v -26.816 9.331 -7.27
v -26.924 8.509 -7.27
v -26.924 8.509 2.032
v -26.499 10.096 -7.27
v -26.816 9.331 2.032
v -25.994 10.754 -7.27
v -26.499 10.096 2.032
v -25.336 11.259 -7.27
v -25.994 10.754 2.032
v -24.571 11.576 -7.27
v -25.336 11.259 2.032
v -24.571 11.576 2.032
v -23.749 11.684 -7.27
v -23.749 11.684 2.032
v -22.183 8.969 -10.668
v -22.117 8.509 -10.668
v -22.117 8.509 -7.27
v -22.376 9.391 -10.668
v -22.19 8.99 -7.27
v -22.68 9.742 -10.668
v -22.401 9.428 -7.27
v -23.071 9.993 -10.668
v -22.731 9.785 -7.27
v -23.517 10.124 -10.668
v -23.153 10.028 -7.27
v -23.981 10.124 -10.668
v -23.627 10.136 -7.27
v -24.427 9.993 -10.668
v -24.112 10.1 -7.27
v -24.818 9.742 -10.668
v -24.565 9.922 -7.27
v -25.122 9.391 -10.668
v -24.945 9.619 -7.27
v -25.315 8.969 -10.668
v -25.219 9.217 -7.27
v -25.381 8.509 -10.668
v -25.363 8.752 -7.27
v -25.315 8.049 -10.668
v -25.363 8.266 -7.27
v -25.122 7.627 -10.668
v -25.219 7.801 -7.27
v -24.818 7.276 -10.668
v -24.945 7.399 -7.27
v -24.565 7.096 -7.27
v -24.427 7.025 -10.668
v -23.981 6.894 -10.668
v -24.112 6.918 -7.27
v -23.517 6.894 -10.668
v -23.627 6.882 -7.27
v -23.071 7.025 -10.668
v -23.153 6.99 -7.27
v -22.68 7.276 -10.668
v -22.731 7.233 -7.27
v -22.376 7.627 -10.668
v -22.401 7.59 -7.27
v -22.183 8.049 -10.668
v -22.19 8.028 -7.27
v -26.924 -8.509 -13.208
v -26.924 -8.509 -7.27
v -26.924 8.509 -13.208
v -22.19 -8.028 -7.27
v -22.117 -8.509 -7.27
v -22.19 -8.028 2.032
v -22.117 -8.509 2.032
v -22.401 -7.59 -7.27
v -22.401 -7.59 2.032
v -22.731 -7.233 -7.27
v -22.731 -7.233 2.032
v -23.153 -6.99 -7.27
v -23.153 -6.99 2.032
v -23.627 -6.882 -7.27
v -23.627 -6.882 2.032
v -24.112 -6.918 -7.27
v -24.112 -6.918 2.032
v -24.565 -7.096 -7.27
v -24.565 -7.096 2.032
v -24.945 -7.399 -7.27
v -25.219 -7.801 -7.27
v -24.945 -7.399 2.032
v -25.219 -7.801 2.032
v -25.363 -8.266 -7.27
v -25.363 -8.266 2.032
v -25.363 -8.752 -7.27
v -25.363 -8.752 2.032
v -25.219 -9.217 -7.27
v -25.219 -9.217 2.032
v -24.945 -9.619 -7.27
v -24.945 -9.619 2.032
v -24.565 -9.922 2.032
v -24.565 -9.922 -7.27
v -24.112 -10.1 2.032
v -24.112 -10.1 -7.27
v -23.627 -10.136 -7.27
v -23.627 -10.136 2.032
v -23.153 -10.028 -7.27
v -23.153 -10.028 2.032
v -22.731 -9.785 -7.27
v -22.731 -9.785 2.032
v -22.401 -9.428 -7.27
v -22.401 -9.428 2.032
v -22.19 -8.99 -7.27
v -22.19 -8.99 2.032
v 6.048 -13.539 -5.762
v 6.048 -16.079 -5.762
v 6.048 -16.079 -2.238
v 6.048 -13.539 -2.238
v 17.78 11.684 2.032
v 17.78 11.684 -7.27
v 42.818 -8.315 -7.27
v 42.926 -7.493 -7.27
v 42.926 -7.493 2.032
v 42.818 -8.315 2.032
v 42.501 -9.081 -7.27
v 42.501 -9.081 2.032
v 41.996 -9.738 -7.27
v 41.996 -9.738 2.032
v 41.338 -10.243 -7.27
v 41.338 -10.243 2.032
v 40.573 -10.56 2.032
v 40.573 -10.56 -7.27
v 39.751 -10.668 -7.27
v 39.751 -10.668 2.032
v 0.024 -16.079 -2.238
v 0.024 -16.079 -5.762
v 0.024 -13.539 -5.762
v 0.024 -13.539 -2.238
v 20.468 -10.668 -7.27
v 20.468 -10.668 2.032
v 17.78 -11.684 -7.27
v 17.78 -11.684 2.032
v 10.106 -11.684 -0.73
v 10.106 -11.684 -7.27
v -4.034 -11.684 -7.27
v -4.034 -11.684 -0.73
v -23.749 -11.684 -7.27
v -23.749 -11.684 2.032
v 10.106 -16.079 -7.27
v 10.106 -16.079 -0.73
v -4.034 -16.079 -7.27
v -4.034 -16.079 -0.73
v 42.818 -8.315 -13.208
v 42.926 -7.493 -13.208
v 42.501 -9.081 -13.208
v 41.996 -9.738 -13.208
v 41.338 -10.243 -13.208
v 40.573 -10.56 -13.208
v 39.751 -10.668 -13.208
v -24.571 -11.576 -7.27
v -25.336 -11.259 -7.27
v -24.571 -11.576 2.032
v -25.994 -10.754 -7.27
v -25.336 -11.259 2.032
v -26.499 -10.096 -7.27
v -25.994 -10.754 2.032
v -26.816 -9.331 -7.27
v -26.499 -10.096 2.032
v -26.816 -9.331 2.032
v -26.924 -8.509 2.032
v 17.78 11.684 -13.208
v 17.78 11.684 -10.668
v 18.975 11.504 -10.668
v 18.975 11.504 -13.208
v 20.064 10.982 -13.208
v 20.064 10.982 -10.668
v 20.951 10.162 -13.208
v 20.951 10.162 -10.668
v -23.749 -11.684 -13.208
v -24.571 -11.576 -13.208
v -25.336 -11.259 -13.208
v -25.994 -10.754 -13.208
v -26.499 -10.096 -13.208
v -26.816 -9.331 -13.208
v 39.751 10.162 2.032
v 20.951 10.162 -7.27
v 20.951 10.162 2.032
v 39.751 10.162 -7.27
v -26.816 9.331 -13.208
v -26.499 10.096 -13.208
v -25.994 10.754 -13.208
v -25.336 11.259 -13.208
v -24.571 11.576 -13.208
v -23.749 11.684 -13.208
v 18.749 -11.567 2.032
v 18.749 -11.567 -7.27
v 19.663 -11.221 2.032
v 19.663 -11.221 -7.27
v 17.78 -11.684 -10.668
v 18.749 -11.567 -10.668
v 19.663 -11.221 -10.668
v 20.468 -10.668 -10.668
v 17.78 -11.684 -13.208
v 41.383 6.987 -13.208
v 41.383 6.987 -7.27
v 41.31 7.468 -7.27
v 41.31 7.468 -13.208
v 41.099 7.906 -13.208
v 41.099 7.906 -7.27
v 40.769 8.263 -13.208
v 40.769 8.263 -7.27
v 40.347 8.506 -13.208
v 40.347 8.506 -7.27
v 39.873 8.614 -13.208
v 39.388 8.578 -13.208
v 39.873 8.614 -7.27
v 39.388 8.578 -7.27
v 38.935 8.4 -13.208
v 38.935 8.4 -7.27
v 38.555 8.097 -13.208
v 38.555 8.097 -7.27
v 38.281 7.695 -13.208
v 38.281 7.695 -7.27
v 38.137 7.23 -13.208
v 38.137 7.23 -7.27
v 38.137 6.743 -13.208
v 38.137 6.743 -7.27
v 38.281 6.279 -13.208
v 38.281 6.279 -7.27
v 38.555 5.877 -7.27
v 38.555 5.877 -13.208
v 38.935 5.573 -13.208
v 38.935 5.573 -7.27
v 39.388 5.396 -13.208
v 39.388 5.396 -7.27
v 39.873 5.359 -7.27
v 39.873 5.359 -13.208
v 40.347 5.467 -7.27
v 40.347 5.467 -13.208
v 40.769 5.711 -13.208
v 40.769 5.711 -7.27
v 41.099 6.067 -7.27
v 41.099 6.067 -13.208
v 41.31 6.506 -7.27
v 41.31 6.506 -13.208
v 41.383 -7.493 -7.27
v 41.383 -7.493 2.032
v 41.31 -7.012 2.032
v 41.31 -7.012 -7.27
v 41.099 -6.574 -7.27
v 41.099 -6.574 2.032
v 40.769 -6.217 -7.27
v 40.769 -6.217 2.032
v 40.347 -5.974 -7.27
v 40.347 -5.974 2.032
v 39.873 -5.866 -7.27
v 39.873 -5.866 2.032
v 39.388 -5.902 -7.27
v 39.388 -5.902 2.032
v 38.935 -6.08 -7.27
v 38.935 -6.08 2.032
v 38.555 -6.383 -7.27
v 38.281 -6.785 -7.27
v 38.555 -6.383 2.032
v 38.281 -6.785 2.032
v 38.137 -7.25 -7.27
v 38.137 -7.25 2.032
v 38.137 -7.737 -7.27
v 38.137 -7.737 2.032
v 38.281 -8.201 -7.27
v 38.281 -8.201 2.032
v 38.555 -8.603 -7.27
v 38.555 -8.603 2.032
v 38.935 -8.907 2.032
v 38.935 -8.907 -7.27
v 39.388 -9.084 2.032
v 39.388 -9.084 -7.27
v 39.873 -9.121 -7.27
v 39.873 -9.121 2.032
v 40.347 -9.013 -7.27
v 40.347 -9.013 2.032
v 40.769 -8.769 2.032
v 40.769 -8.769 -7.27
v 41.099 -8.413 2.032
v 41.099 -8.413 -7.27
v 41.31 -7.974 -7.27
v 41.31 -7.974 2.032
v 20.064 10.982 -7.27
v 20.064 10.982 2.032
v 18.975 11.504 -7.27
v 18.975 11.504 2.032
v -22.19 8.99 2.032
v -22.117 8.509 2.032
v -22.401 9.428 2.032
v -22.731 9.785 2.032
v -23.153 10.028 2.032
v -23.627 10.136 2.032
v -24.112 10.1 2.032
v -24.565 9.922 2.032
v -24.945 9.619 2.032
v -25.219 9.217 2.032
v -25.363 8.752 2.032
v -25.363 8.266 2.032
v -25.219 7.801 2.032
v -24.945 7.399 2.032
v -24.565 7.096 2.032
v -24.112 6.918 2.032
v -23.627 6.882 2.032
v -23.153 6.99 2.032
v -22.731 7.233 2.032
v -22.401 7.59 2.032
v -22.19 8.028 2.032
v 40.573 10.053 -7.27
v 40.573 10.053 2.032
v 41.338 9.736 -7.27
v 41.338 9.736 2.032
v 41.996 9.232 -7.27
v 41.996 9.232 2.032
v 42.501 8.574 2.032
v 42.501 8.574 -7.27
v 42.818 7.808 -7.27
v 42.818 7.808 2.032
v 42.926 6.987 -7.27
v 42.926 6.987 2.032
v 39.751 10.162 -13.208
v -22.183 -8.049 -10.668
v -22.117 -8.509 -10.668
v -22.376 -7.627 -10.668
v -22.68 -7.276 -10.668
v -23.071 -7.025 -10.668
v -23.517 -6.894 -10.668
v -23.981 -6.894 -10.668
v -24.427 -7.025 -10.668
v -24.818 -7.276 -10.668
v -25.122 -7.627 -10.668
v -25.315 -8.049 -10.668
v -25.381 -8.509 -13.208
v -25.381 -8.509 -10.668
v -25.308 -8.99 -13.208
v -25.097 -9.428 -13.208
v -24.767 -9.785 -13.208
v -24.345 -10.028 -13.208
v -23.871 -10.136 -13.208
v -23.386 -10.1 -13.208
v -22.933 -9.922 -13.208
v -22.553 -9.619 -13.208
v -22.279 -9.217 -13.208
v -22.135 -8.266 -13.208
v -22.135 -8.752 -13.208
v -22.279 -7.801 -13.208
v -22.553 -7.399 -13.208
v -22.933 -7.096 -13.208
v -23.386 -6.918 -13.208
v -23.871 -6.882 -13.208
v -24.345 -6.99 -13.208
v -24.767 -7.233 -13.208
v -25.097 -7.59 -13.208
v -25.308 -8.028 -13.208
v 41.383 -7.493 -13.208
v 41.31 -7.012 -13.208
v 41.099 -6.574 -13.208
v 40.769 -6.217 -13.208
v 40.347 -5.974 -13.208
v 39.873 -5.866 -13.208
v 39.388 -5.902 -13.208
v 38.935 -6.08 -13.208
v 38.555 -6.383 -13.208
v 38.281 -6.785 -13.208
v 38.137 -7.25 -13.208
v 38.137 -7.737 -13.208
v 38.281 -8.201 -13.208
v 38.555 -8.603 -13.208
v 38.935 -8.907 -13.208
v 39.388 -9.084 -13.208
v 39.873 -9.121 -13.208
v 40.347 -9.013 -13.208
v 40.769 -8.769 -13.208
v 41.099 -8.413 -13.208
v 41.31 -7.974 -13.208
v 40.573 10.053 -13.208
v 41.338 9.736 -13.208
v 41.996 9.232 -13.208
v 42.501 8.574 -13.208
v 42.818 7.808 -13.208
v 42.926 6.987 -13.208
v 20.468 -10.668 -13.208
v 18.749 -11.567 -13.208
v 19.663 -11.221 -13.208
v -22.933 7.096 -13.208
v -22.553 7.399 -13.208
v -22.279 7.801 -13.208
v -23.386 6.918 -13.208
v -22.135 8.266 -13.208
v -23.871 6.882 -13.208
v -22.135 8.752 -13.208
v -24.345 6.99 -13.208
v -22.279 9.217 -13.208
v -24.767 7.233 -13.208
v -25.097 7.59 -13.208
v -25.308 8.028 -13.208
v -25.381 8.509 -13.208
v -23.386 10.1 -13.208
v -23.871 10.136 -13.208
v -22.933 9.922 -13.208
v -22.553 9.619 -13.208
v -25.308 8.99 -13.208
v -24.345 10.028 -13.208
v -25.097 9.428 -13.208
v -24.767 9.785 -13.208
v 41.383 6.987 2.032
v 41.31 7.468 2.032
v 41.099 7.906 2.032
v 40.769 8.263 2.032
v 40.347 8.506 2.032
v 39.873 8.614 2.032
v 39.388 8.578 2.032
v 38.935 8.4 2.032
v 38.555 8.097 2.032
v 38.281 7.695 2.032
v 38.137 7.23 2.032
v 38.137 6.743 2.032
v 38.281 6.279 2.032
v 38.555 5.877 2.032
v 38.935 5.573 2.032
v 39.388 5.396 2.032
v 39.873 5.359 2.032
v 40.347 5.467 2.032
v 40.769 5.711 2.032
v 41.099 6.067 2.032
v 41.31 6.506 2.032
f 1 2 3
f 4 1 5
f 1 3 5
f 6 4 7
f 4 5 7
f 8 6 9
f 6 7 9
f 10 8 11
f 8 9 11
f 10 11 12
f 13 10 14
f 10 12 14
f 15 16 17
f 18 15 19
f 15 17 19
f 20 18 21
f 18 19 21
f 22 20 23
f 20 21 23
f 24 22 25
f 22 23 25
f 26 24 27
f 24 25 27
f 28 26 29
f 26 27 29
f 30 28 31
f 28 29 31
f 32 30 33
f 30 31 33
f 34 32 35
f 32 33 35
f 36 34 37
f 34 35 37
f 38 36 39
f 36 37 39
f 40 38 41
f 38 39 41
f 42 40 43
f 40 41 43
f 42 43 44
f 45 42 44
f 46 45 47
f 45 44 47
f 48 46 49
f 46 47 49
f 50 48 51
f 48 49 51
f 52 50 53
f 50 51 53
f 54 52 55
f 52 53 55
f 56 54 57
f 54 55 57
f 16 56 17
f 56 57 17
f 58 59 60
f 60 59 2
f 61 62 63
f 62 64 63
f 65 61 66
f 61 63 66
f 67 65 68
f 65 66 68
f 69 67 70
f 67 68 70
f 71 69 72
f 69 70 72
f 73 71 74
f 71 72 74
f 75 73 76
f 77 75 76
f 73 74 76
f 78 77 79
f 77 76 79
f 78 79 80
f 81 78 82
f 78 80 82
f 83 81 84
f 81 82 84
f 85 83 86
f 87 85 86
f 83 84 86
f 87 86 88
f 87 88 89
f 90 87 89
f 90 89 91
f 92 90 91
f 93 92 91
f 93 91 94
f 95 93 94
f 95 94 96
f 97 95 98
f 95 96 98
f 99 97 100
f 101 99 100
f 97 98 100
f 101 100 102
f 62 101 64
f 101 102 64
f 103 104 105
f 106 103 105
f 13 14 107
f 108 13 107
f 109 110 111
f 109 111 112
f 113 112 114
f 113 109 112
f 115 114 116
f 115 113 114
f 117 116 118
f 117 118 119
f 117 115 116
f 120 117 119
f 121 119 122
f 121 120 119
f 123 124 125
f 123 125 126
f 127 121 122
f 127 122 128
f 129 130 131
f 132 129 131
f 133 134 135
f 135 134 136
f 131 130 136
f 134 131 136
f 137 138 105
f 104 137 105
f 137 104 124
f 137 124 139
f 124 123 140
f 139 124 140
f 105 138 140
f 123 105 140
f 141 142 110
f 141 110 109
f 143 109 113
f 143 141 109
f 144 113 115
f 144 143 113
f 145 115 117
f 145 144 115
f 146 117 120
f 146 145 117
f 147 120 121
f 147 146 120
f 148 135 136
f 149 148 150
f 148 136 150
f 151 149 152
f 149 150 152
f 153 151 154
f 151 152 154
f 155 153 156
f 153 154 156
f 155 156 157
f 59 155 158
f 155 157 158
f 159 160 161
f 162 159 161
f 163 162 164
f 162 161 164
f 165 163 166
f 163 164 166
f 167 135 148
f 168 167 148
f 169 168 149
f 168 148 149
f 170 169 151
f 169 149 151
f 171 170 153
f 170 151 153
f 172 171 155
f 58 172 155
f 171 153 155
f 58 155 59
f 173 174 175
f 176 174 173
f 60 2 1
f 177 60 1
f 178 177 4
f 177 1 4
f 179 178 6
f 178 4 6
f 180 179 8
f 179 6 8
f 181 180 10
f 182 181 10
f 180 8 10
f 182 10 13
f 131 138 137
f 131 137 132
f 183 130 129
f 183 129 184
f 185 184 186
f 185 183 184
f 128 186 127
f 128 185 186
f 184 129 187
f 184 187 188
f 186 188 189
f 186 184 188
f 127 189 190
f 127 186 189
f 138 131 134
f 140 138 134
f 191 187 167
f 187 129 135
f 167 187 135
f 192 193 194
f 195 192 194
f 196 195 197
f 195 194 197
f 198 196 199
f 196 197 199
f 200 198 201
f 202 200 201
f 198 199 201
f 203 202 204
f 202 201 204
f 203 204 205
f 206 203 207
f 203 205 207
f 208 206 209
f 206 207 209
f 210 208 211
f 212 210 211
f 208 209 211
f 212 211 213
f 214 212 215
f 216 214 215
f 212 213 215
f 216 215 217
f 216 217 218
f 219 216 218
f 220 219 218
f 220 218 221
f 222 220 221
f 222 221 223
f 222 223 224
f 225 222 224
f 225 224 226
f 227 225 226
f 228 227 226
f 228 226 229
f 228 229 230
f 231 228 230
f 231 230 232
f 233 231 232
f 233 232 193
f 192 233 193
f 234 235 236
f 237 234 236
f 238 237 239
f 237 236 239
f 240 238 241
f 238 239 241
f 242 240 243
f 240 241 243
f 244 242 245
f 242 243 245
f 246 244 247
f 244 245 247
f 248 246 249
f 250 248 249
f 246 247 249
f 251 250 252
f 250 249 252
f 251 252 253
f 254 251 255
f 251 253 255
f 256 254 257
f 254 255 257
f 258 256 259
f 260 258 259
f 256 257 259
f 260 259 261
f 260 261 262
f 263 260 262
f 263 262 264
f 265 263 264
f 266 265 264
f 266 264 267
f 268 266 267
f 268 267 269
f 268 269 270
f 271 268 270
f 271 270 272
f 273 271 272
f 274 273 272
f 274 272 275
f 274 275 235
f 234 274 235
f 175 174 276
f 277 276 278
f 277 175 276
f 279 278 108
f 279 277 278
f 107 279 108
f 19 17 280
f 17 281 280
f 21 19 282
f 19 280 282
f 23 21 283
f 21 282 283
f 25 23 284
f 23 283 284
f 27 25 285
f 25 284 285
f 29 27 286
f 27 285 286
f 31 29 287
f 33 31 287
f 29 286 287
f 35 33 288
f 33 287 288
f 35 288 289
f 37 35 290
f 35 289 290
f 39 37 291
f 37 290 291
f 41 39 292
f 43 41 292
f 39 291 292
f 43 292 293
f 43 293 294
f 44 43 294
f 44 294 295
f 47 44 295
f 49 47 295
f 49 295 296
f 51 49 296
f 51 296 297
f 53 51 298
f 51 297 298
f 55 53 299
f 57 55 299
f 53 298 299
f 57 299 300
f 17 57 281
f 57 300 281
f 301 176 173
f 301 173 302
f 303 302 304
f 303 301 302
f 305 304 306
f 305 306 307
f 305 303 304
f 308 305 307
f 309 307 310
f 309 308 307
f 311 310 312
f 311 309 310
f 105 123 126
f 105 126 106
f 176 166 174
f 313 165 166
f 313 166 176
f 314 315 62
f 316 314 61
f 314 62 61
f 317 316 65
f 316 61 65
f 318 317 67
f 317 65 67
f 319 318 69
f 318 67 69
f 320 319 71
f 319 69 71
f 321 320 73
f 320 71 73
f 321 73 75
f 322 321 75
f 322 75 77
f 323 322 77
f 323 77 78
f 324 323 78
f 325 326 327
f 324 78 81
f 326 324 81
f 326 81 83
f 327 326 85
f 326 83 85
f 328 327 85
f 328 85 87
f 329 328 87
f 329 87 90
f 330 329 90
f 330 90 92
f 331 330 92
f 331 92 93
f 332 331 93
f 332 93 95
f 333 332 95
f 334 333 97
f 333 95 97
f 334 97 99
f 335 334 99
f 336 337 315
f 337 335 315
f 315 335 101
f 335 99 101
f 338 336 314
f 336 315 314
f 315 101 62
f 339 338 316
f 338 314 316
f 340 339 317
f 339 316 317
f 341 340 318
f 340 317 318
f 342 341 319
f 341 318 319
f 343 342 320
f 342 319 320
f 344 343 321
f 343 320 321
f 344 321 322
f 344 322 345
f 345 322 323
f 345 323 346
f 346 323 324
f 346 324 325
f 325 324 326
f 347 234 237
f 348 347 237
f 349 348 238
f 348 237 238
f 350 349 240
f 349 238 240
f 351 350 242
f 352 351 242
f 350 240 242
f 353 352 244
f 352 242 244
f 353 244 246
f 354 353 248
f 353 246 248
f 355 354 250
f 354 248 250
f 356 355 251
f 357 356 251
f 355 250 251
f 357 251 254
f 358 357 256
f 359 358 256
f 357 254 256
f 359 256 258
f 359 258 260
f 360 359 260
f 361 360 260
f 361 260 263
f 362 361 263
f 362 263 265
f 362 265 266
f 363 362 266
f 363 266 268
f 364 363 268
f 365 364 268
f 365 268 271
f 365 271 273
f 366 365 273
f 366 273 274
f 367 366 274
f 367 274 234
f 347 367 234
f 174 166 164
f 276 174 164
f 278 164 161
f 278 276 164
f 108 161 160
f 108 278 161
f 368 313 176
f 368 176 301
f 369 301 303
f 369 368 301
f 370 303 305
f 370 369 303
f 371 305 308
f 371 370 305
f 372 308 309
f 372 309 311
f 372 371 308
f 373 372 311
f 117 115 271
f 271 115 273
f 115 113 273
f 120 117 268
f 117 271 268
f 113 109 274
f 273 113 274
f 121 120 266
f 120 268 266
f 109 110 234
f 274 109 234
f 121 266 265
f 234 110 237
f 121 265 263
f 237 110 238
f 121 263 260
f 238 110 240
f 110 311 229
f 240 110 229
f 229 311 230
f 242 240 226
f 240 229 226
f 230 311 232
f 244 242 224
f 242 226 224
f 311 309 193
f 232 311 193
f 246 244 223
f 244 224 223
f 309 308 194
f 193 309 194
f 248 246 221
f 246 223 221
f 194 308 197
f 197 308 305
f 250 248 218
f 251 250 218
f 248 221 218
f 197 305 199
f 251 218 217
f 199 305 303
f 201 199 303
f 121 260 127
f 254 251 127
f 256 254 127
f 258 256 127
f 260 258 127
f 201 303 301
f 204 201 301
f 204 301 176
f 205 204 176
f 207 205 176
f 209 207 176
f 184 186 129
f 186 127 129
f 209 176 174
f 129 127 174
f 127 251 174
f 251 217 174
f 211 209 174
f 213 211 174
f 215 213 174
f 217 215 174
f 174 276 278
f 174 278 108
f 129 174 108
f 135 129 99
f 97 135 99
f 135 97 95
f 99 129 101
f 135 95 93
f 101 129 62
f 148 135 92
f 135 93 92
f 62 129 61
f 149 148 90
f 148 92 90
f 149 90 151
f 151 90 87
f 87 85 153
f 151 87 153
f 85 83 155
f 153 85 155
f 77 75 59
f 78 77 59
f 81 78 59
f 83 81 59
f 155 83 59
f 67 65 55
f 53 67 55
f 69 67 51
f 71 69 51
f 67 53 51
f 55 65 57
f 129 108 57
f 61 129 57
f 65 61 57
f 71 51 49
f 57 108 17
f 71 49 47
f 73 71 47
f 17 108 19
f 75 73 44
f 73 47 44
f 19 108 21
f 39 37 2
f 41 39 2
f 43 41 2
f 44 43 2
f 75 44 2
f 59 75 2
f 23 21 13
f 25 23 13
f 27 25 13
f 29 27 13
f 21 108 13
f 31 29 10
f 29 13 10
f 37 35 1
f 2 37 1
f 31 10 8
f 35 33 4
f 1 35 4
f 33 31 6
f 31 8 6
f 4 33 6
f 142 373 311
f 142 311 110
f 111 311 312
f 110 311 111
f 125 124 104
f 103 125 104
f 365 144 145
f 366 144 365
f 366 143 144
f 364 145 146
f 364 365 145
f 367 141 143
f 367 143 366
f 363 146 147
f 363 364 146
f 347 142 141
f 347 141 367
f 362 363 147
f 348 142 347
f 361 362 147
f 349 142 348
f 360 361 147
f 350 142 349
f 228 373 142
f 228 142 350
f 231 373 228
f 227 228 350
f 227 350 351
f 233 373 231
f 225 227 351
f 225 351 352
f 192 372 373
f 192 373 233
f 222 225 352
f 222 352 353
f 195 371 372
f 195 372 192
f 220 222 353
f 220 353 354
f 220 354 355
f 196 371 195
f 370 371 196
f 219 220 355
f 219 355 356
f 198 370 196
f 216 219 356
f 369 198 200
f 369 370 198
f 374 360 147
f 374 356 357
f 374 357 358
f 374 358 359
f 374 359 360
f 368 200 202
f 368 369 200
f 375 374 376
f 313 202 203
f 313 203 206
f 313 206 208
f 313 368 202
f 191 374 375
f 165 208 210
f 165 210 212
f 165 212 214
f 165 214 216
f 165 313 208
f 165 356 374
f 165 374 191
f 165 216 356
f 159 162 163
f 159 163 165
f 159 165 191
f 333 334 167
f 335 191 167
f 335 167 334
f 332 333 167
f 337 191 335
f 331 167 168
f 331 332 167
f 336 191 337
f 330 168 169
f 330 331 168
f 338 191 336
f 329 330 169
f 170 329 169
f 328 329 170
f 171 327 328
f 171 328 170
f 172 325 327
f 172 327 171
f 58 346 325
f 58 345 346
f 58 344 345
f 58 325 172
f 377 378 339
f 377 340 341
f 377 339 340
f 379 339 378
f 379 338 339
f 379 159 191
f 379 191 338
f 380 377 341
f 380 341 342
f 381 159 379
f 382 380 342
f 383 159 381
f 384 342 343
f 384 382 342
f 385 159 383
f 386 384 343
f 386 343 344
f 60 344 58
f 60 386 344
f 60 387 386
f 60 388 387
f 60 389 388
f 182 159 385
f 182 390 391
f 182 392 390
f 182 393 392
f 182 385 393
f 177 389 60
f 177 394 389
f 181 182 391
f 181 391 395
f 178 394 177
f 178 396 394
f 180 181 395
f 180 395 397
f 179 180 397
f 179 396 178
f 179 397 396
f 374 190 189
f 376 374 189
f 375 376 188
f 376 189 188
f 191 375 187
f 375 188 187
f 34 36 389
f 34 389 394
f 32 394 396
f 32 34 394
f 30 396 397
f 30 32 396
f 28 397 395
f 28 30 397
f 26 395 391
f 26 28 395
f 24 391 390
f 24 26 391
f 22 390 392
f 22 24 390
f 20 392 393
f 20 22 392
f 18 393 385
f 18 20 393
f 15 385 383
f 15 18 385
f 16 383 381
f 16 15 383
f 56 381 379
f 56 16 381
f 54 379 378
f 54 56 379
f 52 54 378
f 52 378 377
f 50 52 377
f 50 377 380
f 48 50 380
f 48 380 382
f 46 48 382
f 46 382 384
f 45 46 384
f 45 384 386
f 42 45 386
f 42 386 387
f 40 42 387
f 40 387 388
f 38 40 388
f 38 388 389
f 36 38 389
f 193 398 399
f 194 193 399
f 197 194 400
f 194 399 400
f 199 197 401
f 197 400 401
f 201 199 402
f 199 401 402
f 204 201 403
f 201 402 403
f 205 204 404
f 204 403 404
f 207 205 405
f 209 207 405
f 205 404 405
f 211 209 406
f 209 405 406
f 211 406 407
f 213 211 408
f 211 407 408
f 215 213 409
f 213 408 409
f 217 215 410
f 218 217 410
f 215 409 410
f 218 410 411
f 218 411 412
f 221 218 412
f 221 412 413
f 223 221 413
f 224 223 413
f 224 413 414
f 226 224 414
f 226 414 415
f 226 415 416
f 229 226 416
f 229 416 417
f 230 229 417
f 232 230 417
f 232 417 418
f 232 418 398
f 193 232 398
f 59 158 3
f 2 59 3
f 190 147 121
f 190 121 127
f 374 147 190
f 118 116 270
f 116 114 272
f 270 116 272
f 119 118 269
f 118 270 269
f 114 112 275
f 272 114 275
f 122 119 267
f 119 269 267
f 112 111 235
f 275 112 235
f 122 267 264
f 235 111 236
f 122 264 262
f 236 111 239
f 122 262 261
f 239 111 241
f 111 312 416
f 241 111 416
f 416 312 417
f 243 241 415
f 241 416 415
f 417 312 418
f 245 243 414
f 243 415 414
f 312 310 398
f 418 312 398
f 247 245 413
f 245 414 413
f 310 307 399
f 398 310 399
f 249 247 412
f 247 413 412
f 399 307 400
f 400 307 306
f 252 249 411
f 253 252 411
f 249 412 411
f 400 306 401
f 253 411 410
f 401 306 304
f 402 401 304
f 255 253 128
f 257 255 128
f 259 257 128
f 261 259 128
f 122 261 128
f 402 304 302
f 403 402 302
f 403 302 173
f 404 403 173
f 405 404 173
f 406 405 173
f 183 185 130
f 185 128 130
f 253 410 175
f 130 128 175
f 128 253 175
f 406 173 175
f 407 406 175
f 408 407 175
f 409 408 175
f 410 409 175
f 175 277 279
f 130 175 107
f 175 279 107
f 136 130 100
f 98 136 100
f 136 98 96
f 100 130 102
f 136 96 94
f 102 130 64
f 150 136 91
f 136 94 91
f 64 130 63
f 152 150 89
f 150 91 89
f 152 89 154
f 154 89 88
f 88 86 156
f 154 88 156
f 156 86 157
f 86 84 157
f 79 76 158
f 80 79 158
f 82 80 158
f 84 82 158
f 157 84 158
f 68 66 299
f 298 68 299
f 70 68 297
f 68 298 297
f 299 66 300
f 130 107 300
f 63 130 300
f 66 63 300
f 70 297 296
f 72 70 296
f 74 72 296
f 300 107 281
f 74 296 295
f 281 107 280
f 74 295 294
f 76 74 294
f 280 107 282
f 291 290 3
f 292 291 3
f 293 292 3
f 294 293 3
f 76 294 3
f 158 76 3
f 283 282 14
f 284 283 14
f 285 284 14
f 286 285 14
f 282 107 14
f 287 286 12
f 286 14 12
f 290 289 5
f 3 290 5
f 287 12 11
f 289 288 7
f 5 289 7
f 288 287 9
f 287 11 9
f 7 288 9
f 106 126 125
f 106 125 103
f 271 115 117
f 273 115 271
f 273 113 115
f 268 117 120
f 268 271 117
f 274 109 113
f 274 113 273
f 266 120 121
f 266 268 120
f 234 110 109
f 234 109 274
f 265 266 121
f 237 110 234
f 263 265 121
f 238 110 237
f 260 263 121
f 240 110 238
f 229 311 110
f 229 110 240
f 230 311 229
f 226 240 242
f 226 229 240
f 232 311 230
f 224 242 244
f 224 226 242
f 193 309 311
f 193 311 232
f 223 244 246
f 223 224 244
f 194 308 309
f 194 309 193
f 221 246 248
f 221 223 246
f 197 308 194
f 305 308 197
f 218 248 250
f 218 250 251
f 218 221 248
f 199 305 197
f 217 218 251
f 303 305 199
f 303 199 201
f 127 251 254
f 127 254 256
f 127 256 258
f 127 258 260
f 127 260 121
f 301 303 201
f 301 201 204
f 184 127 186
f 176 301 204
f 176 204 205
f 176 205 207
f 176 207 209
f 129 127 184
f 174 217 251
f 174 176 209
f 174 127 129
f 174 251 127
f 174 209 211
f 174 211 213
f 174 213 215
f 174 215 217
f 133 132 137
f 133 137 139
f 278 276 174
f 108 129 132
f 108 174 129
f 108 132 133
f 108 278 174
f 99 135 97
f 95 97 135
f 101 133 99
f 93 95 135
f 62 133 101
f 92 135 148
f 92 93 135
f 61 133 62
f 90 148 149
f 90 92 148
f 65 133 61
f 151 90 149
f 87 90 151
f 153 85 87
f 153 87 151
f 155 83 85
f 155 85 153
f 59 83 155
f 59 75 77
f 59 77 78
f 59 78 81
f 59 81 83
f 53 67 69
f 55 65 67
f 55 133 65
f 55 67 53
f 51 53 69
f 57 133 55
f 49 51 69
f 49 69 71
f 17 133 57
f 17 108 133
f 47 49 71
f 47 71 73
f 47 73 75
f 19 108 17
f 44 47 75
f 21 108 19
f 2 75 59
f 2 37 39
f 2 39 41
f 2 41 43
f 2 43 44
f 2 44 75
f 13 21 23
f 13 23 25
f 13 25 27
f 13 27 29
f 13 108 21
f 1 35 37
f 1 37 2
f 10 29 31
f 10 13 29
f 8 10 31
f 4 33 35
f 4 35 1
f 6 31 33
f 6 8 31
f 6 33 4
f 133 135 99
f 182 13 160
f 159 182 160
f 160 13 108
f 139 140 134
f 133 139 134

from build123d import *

# Parameters (mm, degrees)
BOSS_EXTRUDE1_START             = 2.032
BOSS_EXTRUDE1_DEPTH             = 12.7
BOSS_EXTRUDE2_DEPTH             = 3.27
BOSS_EXTRUDE2_DEPTH_BACK        = 3.27
SKETCH2_W                       = 14.14
SKETCH2_H                       = 7.9502
SKETCH3_W                       = 36.079999008
SKETCH3_H                       = 20.829999962
BOSS_EXTRUDE3_DEPTH             = 2.54
BOSS_EXTRUDE3_DIRECTION_2_REACH = 31.949
SKETCH7_W                       = 6.024
SKETCH7_H                       = 3.524
CUT_EXTRUDE1_DEPTH              = 2.54
BOSS_EXTRUDE5_DEPTH             = 12.7
F_4_CLEARANCE_HOLE4_D           = 3.2639
BOSS_EXTRUDE6_DEPTH             = 15.24
F_4_CLEARANCE_HOLE5_D           = 3.2639
SKETCH17_R                      = 1.63195
BOSS_EXTRUDE8_DEPTH             = 2.54


with BuildPart() as part:
    # Sketch1 → Boss-Extrude1 (new body)
    with BuildSketch(Plane.XY.offset(BOSS_EXTRUDE1_START)):
        with BuildLine():
            Line((-21.844, 7.62), (-21.844, -7.62))
            ThreePointArc((-21.844, -7.62), (-20.653681959, -10.493681959), (-17.78, -11.684))
            Line((-17.78, -11.684), (17.78, -11.684))
            ThreePointArc((17.78, -11.684), (20.653681959, -10.493681959), (21.844, -7.62))
            Line((21.844, -7.62), (21.844, 7.62))
            ThreePointArc((21.844, 7.62), (20.653681959, 10.493681959), (17.78, 11.684))
            Line((17.78, 11.684), (-17.78, 11.684))
            ThreePointArc((-17.78, 11.684), (-20.653681959, 10.493681959), (-21.844, 7.62))
        make_face()
    extrude(amount=-BOSS_EXTRUDE1_DEPTH)

    # Sketch2 → Boss-Extrude2 (add, two sides: drawn at the far end of the back side and taken through both)
    with BuildSketch(Plane(origin=(0, 0, -4), x_dir=(-1, 0, 0), z_dir=(0, 0, -1)).offset(-BOSS_EXTRUDE2_DEPTH_BACK)):
        with Locations((-3.036000992, -12.10347265)):
            Rectangle(SKETCH2_W, SKETCH2_H)
    extrude(amount=BOSS_EXTRUDE2_DEPTH + BOSS_EXTRUDE2_DEPTH_BACK)

    # Sketch3 → Boss-Extrude3 (add)
    with BuildSketch(Plane(origin=(0, 0, -10.668), x_dir=(-1, 0, 0), z_dir=(0, 0, -1))):
        with Locations((-19.806000496, -0.253372669)):
            Rectangle(SKETCH3_W, SKETCH3_H)
    extrude(amount=BOSS_EXTRUDE3_DEPTH)

    # Boss-Extrude3 direction 2: up to this face of the body (flat: up to its plane)
    boss_extrude3_direction_2_end = Plane(part.part.faces().sort_by_distance((0, 0, 2.032))[0])
    # Sketch3 → Boss-Extrude3 direction 2 (add, up to the picked face)
    with BuildSketch(Plane(origin=(0, 0, -10.668), x_dir=(-1, 0, 0), z_dir=(0, 0, -1)), mode=Mode.PRIVATE) as boss_extrude3_direction_2_sk1:
        with Locations((-19.806000496, -0.253372669)):
            Rectangle(SKETCH3_W, SKETCH3_H)
    boss_extrude3_direction_2_tool1 = split(extrude(boss_extrude3_direction_2_sk1.sketch, amount=-BOSS_EXTRUDE3_DIRECTION_2_REACH, mode=Mode.PRIVATE), bisect_by=boss_extrude3_direction_2_end, keep=Keep.BOTH, mode=Mode.PRIVATE)
    add(boss_extrude3_direction_2_tool1.solids().sort_by(Axis((19.806, -0.253373, -10.668), (0, 0, 1)))[0])

    # Sketch7 → Cut-Extrude1 (cut)
    with BuildSketch(Plane.XZ.offset(16.07857265)):
        with Locations((3.036000992, -4)):
            Rectangle(SKETCH7_W, SKETCH7_H)
    extrude(amount=-CUT_EXTRUDE1_DEPTH, mode=Mode.SUBTRACT)

    # Sketch11 → Boss-Extrude5 (add, through all)
    with BuildSketch(Plane(origin=(0, 0, -10.668), x_dir=(-1, 0, 0), z_dir=(0, 0, -1))):
        with BuildLine():
            Line((17.78, 11.684), (23.749, 11.684))
            ThreePointArc((23.749, 11.684), (25.99406403, 10.75406403), (26.924, 8.509))
            Line((26.924, 8.509), (26.924, -8.509))
            ThreePointArc((26.924, -8.509), (25.99406403, -10.75406403), (23.749, -11.684))
            Line((23.749, -11.684), (17.78, -11.684))
            Line((17.78, -11.684), (-17.78, -11.684))
            ThreePointArc((-17.78, -11.684), (-19.216577452, -11.421623499), (-20.467660727, -10.66837265))
            Line((-20.467660727, -10.66837265), (-1.766000992, -10.66837265))
            Line((-1.766000992, -10.66837265), (-1.766000992, 10.161627312))
            Line((-1.766000992, 10.161627312), (-20.951155406, 10.161627312))
            ThreePointArc((-20.951155406, 10.161627312), (-19.538823841, 11.283691403), (-17.78, 11.684))
            Line((-17.78, 11.684), (17.78, 11.684))
        make_face()
    extrude(amount=-BOSS_EXTRUDE5_DEPTH)

    # #4 Clearance Hole4 (through all)
    with Locations(Plane(origin=(0, 0, -10.668), x_dir=(-1, 0, 0), z_dir=(0, 0, -1))):
        with Locations((23.749, 8.509), (23.749, -8.509)):
            Hole(F_4_CLEARANCE_HOLE4_D / 2)

    # Sketch14 → Boss-Extrude6 (add, through all)
    with BuildSketch(Plane(origin=(0, 0, -13.208), x_dir=(-1, 0, 0), z_dir=(0, 0, -1))):
        with BuildLine():
            Line((-37.846, 10.161627312), (-39.751, 10.161627312))
            ThreePointArc((-39.751, 10.161627312), (-41.99606403, 9.231691342), (-42.926, 6.986627312))
            Line((-42.926, 6.986627312), (-42.926, -7.49337265))
            ThreePointArc((-42.926, -7.49337265), (-41.99606403, -9.73843668), (-39.751, -10.66837265))
            Line((-39.751, -10.66837265), (-37.846, -10.66837265))
            Line((-37.846, -10.66837265), (-37.846, 10.161627312))
        make_face()
    extrude(amount=-BOSS_EXTRUDE6_DEPTH)

    # #4 Clearance Hole5 (through all)
    with Locations(Plane(origin=(0, 0, -13.208), x_dir=(-1, 0, 0), z_dir=(0, 0, -1))):
        with Locations((-39.751, 6.986627312), (-39.751, -7.49337265)):
            Hole(F_4_CLEARANCE_HOLE5_D / 2)

    # Sketch17 → Boss-Extrude8 (add)
    with BuildSketch(Plane(origin=(0, 0, -10.668), x_dir=(-1, 0, 0), z_dir=(0, 0, -1))):
        with BuildLine():
            Line((-17.78, -11.684), (23.749, -11.684))
            ThreePointArc((23.749, -11.684), (25.99406403, -10.75406403), (26.924, -8.509))
            Line((26.924, -8.509), (26.924, 8.509))
            ThreePointArc((26.924, 8.509), (25.99406403, 10.75406403), (23.749, 11.684))
            Line((23.749, 11.684), (-17.78, 11.684))
            ThreePointArc((-17.78, 11.684), (-19.538823841, 11.283691403), (-20.951155406, 10.161627312))
            Line((-20.951155406, 10.161627312), (-1.766000992, 10.161627312))
            Line((-1.766000992, 10.161627312), (-1.766000992, -10.66837265))
            Line((-1.766000992, -10.66837265), (-20.467660727, -10.66837265))
            ThreePointArc((-20.467660727, -10.66837265), (-19.216577452, -11.421623499), (-17.78, -11.684))
        make_face()
        with Locations((23.749, 8.509)):
            Circle(SKETCH17_R, mode=Mode.SUBTRACT)
        with Locations((23.749, -8.509)):
            Circle(SKETCH17_R, mode=Mode.SUBTRACT)
    extrude(amount=BOSS_EXTRUDE8_DEPTH)


with BuildPart() as body_2:
    # Split1: the piece on the far side of the plane
    add(part.part)
    split(bisect_by=Plane(origin=(0, 0, -7.27), x_dir=(-1, 0, 0), z_dir=(0, 0, -1)), keep=Keep.BOTTOM)


with BuildPart() as part_1:
    add(part.part)

    # Split1
    split(bisect_by=Plane(origin=(0, 0, -7.27), x_dir=(-1, 0, 0), z_dir=(0, 0, -1)), keep=Keep.TOP)


solid = Compound([body_2.part, part_1.part])
